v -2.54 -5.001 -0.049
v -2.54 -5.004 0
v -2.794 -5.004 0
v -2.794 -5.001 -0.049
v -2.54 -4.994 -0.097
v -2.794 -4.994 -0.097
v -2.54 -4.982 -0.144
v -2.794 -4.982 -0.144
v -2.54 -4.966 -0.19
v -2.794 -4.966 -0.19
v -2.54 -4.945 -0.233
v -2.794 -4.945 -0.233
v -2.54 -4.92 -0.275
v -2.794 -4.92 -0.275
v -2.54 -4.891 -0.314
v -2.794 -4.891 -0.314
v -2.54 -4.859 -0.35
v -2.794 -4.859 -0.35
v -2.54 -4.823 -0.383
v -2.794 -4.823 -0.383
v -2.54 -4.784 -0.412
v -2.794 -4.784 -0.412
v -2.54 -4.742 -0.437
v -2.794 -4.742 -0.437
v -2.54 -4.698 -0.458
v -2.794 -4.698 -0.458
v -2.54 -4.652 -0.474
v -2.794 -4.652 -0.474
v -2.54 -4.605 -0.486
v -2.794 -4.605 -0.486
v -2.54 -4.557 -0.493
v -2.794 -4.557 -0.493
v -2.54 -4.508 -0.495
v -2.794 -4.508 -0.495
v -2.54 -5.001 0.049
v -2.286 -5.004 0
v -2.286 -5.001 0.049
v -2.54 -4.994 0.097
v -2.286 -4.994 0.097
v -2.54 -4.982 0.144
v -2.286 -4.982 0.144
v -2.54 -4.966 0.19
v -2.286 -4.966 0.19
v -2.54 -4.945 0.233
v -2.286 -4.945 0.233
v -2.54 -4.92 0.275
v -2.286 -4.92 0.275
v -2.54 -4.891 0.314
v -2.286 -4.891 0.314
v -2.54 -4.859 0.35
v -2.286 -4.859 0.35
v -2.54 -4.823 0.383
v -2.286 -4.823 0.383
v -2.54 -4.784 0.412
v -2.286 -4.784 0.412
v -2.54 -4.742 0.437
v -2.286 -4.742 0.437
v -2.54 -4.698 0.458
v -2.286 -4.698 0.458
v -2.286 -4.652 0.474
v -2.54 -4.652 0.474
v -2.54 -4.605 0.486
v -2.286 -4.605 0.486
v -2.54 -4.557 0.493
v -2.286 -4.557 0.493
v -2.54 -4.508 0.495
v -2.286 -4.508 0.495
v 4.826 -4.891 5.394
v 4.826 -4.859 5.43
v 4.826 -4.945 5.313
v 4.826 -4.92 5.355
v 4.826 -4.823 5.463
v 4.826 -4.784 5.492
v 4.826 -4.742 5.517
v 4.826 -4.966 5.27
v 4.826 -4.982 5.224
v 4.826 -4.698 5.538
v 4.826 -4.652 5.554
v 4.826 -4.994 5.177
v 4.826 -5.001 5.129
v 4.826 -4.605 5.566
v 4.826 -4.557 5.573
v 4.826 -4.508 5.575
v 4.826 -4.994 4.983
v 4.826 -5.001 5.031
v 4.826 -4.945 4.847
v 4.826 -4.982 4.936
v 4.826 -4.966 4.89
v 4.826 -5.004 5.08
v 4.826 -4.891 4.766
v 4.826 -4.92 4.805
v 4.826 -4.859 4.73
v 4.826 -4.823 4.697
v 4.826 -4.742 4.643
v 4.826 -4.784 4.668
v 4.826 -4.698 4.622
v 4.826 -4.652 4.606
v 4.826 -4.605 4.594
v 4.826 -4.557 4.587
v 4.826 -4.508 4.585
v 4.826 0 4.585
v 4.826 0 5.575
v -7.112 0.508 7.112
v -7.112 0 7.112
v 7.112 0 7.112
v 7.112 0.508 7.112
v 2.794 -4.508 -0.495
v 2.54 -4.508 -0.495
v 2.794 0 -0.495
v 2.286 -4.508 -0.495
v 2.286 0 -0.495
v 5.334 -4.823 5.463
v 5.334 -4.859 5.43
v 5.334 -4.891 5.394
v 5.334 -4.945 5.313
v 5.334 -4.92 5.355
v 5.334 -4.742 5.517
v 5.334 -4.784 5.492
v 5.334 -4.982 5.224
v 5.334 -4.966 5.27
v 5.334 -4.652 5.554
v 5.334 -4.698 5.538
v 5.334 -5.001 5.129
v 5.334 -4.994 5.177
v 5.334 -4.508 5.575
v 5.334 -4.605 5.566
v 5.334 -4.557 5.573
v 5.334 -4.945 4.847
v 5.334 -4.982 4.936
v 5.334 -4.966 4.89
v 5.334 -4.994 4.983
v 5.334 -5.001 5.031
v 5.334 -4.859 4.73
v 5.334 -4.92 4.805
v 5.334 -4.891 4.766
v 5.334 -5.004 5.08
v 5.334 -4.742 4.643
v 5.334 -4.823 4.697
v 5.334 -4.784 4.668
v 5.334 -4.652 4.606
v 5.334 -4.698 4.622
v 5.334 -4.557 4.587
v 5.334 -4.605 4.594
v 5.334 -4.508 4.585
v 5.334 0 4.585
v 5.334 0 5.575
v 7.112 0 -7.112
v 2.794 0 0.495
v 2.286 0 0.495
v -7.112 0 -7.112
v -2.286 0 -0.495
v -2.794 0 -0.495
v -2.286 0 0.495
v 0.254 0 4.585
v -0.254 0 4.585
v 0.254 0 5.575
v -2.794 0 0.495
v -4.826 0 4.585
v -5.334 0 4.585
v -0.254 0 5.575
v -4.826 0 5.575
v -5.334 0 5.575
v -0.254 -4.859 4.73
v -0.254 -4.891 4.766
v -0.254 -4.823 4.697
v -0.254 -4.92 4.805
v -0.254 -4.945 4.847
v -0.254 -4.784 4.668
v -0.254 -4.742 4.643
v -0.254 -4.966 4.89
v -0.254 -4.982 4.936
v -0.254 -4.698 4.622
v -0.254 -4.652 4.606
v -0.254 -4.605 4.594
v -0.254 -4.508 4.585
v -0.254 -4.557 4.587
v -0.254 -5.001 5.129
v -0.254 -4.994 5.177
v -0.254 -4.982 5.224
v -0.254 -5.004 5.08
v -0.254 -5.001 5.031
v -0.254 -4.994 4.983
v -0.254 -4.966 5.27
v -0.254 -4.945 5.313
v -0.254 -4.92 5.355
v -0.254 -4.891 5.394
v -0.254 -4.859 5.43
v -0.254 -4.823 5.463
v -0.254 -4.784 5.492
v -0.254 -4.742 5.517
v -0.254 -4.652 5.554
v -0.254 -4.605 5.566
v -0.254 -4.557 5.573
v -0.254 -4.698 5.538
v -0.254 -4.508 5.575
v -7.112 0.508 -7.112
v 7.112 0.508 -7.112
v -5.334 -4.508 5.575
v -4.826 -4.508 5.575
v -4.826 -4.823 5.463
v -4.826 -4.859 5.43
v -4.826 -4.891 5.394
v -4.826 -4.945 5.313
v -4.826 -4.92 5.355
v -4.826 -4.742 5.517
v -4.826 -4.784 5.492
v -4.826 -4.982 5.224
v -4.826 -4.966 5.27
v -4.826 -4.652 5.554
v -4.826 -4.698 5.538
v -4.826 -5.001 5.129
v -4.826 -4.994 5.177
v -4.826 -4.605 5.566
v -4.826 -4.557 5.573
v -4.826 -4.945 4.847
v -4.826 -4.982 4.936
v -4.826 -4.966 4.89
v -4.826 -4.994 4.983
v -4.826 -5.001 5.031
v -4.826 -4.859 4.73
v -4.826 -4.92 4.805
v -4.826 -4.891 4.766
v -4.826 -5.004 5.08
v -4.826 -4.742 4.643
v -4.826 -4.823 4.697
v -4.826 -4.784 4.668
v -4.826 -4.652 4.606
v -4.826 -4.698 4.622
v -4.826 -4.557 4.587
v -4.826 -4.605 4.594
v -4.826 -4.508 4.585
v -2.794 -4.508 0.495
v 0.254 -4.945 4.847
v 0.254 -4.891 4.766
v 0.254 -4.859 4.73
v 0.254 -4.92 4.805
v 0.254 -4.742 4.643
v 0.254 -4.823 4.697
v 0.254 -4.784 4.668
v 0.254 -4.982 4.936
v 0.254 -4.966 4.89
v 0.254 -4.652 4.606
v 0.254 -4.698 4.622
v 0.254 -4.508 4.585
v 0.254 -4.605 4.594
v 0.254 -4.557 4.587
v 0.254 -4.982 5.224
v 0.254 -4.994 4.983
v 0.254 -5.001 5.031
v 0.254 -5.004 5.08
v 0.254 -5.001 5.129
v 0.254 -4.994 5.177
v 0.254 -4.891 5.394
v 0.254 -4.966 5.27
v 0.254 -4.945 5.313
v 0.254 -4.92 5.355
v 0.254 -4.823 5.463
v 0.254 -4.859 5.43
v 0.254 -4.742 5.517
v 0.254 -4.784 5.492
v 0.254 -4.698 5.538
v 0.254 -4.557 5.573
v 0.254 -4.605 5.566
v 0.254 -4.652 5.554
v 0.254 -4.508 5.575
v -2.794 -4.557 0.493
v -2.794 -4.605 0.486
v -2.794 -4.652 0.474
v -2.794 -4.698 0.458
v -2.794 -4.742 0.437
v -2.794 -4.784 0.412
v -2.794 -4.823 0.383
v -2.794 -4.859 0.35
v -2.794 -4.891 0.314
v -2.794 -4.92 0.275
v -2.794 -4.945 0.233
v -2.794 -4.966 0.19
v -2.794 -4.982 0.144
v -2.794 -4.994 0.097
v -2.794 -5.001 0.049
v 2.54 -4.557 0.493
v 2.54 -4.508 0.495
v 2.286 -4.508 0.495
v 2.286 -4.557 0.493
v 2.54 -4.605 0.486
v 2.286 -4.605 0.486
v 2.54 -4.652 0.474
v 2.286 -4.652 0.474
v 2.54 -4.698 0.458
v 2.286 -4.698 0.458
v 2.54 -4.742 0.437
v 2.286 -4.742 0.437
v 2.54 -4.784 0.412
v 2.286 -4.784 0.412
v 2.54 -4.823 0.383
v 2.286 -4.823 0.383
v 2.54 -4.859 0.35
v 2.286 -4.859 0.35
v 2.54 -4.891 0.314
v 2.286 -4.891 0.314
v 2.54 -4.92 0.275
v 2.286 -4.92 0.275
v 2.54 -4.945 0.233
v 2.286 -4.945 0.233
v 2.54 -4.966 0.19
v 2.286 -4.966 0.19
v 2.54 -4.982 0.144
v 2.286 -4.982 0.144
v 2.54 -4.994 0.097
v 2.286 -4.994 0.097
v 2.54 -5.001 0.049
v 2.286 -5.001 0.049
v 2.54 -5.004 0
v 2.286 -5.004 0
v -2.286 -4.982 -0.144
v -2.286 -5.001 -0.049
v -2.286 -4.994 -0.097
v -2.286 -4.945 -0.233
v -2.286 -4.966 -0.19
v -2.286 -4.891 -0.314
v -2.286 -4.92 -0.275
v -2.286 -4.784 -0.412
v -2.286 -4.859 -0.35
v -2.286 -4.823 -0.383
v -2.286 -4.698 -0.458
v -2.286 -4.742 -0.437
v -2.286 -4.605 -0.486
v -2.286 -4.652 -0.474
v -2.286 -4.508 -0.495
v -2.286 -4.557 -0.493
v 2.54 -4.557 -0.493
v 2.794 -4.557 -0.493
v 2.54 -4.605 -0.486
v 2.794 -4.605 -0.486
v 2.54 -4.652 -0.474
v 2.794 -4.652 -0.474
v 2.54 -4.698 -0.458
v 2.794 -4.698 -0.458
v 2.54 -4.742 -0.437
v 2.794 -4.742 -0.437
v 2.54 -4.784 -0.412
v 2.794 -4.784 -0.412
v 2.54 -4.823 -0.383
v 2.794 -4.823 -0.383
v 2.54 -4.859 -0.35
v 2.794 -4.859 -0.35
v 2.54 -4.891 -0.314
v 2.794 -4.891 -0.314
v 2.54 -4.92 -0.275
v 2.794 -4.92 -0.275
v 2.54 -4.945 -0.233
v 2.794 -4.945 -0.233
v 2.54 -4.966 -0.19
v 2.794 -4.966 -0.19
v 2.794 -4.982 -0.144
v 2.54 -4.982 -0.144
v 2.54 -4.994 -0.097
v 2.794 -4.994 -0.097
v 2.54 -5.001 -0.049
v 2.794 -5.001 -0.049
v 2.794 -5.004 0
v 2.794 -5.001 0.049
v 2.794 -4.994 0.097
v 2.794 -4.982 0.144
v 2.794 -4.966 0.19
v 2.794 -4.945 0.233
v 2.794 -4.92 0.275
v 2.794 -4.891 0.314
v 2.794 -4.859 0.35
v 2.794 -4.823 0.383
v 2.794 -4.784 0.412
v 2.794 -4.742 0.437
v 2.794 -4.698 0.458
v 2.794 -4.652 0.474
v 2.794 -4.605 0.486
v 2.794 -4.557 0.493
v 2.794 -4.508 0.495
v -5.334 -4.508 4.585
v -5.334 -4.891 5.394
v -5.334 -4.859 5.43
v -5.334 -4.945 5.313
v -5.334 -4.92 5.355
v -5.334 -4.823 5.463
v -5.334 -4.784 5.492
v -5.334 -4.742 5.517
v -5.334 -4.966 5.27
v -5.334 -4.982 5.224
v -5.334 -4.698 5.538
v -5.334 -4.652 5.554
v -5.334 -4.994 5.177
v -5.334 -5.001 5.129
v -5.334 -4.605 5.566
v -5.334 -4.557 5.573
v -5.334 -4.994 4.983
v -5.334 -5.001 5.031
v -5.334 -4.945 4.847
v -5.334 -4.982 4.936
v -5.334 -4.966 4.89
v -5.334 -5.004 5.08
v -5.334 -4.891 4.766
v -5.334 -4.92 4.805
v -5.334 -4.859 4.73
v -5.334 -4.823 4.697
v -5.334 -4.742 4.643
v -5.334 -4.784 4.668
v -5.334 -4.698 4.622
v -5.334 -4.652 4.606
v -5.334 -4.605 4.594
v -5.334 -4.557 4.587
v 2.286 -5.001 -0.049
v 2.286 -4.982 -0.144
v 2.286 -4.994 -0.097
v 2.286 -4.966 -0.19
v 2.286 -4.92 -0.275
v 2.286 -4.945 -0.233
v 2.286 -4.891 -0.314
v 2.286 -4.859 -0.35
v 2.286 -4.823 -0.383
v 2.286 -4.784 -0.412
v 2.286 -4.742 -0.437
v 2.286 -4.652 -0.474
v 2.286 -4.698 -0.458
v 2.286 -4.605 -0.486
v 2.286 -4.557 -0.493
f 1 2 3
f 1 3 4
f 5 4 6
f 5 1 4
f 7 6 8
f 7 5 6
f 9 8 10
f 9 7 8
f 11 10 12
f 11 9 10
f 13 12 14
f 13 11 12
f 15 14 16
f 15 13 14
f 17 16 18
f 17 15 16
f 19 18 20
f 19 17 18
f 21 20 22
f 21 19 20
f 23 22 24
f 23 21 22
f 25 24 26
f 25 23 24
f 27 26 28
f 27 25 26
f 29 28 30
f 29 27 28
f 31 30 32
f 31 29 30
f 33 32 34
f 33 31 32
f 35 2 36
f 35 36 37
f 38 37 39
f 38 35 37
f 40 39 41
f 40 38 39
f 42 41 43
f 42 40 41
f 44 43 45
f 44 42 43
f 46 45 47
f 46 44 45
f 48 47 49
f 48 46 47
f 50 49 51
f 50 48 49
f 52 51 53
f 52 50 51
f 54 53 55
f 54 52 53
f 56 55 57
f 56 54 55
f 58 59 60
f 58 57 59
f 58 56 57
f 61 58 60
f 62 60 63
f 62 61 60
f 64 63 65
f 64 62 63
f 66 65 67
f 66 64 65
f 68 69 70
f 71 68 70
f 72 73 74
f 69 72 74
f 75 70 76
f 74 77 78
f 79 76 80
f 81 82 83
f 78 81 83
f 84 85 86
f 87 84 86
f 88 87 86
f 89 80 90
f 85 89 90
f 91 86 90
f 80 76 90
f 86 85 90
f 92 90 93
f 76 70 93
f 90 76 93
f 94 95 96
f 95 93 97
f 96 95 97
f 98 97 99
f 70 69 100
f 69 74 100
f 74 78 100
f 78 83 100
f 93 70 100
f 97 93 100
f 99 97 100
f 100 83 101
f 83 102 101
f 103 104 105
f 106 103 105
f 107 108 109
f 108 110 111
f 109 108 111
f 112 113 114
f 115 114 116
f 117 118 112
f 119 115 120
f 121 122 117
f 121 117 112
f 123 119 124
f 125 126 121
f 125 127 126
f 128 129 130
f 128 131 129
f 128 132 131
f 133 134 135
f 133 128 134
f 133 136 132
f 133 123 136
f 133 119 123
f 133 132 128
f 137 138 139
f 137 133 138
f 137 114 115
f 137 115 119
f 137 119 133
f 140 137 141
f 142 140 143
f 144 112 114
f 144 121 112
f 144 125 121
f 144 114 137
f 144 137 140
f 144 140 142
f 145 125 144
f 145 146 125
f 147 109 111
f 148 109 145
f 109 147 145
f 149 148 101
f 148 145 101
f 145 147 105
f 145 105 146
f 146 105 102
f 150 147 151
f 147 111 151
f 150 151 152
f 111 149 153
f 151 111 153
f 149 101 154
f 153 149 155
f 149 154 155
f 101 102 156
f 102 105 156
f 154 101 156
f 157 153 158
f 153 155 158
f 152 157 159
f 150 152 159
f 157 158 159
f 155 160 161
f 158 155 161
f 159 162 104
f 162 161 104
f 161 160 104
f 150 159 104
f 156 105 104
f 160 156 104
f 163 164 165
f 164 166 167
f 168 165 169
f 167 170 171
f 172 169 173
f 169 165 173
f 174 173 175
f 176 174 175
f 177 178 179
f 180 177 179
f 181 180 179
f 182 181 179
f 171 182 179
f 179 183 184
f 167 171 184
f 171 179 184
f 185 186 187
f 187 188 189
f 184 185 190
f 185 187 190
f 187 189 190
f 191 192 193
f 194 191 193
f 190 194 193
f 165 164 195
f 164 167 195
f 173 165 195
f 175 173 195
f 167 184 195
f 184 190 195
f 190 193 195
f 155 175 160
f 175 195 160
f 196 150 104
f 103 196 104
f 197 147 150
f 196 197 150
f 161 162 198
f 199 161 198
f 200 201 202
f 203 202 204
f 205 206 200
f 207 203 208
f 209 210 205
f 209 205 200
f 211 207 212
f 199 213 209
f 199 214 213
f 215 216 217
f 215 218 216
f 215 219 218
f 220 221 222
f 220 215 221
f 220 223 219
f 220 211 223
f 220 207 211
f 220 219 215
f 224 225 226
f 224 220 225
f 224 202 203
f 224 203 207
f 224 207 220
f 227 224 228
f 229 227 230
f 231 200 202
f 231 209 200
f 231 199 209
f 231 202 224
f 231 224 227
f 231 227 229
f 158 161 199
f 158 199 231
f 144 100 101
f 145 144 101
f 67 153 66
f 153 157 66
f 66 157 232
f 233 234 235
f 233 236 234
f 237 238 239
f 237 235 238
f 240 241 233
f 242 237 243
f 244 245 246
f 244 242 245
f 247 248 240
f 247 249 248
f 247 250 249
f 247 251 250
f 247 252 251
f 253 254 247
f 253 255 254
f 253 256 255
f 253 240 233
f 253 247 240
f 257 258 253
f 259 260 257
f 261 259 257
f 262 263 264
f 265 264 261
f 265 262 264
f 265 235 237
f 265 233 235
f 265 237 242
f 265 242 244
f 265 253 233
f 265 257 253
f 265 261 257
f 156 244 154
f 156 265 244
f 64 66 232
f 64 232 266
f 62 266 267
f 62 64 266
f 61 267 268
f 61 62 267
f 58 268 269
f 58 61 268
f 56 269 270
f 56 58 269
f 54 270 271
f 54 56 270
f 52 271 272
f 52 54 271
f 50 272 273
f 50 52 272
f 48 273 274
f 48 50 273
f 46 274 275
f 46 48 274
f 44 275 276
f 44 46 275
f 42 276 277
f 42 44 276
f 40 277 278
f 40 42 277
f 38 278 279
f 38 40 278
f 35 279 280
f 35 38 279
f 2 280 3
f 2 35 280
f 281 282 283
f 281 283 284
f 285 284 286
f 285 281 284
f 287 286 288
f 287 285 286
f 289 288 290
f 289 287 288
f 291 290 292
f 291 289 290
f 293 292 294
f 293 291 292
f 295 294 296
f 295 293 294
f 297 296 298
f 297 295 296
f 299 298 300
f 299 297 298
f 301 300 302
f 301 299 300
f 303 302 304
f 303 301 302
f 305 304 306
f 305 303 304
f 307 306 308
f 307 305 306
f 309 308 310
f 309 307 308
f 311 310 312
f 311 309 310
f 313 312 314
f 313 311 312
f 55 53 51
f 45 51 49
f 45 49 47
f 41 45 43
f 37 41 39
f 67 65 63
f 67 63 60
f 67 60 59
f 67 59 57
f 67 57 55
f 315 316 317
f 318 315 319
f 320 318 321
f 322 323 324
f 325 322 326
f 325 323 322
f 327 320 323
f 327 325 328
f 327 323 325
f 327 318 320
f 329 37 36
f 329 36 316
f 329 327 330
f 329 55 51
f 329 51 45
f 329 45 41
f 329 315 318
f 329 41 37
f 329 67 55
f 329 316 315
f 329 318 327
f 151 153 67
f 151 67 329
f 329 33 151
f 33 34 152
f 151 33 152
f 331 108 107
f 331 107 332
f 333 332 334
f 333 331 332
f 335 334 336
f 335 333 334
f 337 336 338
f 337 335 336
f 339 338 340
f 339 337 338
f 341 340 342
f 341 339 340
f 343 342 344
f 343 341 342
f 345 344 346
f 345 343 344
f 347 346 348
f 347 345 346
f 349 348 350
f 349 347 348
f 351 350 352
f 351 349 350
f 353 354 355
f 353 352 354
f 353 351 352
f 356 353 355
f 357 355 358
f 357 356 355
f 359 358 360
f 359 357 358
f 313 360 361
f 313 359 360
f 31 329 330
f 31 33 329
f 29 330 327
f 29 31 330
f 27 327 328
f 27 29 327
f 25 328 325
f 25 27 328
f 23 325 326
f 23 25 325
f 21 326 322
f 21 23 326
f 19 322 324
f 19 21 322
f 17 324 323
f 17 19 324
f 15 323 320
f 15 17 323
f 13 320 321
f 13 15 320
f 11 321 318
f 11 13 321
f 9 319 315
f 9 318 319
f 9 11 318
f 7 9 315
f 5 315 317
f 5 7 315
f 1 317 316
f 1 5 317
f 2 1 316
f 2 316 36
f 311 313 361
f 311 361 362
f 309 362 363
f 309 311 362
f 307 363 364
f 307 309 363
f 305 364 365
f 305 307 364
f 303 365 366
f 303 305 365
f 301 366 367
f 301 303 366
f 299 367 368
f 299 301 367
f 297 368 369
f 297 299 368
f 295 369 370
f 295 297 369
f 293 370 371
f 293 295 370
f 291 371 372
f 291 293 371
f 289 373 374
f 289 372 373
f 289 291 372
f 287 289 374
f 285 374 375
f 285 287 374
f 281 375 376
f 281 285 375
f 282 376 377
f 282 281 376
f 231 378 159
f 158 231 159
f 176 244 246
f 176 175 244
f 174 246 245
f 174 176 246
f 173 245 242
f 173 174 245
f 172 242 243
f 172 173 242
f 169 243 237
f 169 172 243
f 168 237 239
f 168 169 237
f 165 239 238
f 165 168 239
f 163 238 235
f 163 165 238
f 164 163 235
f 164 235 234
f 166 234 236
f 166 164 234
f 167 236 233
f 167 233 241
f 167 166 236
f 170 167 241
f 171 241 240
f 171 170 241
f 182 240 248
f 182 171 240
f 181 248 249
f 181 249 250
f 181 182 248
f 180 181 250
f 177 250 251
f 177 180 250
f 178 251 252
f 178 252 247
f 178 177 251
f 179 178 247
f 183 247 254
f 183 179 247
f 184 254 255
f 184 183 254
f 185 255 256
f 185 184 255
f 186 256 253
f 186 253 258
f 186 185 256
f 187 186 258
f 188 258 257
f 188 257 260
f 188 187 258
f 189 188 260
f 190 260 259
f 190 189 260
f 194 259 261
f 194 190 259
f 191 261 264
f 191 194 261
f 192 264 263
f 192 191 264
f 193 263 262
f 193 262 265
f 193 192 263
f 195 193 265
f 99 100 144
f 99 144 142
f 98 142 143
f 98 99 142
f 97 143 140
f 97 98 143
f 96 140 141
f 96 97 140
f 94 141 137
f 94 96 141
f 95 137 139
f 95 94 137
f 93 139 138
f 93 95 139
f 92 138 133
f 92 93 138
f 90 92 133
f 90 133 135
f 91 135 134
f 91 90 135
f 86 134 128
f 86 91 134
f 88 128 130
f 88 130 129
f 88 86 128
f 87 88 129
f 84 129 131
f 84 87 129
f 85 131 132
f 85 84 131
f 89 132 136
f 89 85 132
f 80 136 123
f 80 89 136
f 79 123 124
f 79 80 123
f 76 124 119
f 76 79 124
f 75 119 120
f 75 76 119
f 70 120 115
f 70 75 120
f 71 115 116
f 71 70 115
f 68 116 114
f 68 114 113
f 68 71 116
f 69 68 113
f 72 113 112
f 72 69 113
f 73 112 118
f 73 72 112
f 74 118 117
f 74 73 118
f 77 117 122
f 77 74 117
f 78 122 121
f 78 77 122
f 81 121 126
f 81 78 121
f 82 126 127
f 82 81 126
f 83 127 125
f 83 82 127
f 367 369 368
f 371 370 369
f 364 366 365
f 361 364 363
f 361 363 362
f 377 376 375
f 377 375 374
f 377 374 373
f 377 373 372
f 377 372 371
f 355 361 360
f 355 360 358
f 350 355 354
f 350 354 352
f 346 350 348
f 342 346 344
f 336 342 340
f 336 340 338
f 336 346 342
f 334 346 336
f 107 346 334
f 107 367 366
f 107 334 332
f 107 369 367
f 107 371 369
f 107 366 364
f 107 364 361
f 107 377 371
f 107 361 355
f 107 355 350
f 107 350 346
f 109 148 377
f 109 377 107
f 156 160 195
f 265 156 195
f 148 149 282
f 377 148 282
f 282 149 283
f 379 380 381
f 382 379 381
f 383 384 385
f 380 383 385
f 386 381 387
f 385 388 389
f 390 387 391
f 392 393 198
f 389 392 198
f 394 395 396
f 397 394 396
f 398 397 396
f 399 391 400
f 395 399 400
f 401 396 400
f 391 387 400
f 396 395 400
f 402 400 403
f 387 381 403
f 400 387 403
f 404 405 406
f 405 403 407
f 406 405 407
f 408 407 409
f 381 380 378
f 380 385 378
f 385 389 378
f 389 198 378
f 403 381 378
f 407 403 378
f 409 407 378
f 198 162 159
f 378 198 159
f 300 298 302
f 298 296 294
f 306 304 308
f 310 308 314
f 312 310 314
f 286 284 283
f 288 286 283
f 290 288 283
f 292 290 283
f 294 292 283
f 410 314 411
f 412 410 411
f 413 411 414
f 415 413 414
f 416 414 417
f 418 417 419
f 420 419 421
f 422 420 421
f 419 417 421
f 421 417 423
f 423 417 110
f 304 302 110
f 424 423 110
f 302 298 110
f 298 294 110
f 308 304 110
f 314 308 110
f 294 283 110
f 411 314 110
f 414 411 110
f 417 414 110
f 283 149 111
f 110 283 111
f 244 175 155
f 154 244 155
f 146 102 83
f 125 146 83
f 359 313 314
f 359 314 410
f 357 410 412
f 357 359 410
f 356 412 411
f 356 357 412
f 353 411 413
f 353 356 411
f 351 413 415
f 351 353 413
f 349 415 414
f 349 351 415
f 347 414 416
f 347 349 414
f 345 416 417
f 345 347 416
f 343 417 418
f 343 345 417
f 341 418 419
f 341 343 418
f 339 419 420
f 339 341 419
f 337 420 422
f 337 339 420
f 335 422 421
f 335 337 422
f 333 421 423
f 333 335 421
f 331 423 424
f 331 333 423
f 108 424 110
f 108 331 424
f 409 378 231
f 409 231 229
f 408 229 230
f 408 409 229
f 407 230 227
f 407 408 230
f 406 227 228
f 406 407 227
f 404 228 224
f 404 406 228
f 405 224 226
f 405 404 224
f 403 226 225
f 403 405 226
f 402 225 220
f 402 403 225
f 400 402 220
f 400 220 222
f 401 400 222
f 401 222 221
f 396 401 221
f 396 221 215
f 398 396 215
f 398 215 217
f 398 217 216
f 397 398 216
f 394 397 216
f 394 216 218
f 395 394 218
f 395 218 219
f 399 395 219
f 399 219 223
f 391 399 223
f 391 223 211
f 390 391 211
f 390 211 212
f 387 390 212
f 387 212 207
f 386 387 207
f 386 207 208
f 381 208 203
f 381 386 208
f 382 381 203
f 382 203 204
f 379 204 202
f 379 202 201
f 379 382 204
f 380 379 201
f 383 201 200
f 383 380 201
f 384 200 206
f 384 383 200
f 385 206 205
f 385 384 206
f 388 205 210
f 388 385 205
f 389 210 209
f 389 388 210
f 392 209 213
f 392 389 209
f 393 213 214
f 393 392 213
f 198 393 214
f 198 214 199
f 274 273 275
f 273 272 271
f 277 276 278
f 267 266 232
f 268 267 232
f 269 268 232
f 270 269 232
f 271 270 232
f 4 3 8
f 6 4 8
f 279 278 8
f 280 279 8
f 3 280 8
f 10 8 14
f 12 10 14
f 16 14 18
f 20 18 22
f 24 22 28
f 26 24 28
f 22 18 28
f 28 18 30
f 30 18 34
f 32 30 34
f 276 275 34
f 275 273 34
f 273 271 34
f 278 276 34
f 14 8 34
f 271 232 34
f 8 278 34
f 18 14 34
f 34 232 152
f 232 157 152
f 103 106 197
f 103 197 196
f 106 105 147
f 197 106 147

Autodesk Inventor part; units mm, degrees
sketch "Sketch_1" plane through (0, 0, 0) normal (0, 1, 0) x (-1, 0, 0)
  line L0 (7.112, -7.112) -> (7.112, 7.112)
  line L1 (7.112, 7.112) -> (-7.112, 7.112)
  line L2 (-7.112, 7.112) -> (-7.112, -7.112)
  line L3 (-7.112, -7.112) -> (7.112, -7.112)
extrude "Extrusion1" add sketch "Sketch_1" along normal blind 0.508
sketch "Sketch_10" plane through (-5.08, 0, 0) normal (1, 0, 0) x (0, 0, -1)
  arc A0 (-5.5753, -4.5085) -> (-5.08, -5.0038) centre (-5.08, -4.5085) ccw
  arc A1 (-5.08, -5.0038) -> (-4.5847, -4.5085) centre (-5.08, -4.5085) ccw
  line L0 (-4.5847, -4.5085) -> (-4.5847, 0.508)
  line L1 (-4.5847, 0.508) -> (-5.5753, 0.508)
  line L2 (-5.5753, 0.508) -> (-5.5753, -4.5085)
extrude "Extrusion2" add sketch "Sketch_10" along normal mid plane 0.508
sketch "Sketch_12" plane through (0, 0, 0) normal (1, 0, 0) x (0, 1, 0)
  arc A0 (-4.5085, 5.5753) -> (-5.0038, 5.08) centre (-4.5085, 5.08) ccw
  arc A1 (-5.0038, 5.08) -> (-4.5085, 4.5847) centre (-4.5085, 5.08) ccw
  line L0 (-4.5085, 4.5847) -> (0.508, 4.5847)
  line L1 (0.508, 4.5847) -> (0.508, 5.5753)
  line L2 (0.508, 5.5753) -> (-4.5085, 5.5753)
extrude "Extrusion3" add sketch "Sketch_12" along normal mid plane 0.508
sketch "Sketch_14" plane through (5.08, 0, 0) normal (1, 0, 0) x (0, 0, -1)
  arc A0 (-5.5753, -4.5085) -> (-5.08, -5.0038) centre (-5.08, -4.5085) ccw
  arc A1 (-5.08, -5.0038) -> (-4.5847, -4.5085) centre (-5.08, -4.5085) ccw
  line L0 (-4.5847, -4.5085) -> (-4.5847, 0.508)
  line L1 (-4.5847, 0.508) -> (-5.5753, 0.508)
  line L2 (-5.5753, 0.508) -> (-5.5753, -4.5085)
extrude "Extrusion4" add sketch "Sketch_14" along normal mid plane 0.508
sketch "Sketch_16" plane through (-2.54, 0, 0) normal (1, 0, 0) x (0, 0, -1)
  line L0 (-0.4953, 0.508) -> (-0.4953, -4.5085)
  arc A0 (-0.4953, -4.5085) -> (0, -5.0038) centre (0, -4.5085) ccw
  arc A1 (0, -5.0038) -> (0.4953, -4.5085) centre (0, -4.5085) ccw
  line L1 (0.4953, -4.5085) -> (0.4953, 0.508)
  line L2 (0.4953, 0.508) -> (-0.4953, 0.508)
extrude "Extrusion5" add sketch "Sketch_16" along normal mid plane 0.508
sketch "Sketch_17" plane through (2.54, 0, 0) normal (1, 0, 0) x (0, 0, -1)
  line L0 (-0.4953, 0.508) -> (-0.4953, -4.5085)
  arc A0 (-0.4953, -4.5085) -> (0, -5.0038) centre (0, -4.5085) ccw
  arc A1 (0, -5.0038) -> (0.4953, -4.5085) centre (0, -4.5085) ccw
  line L1 (0.4953, -4.5085) -> (0.4953, 0.508)
  line L2 (0.4953, 0.508) -> (-0.4953, 0.508)
extrude "Extrusion6" add sketch "Sketch_17" along normal mid plane 0.508
ref_plane "pole_to_body_XY" through (0, 0.508, 0) normal (0, 1, 0) x (1, 0, 0)
ref_plane "pole_to_body_YZ" through (0, 0.508, 0) normal (1, 0, 0) x (0, 0, -1)
ref_plane "pole_to_body_ZX" through (0, 0.508, 0) normal (0, 0, -1) x (0, 1, 0)
properties part number "UB21G035D-1JBpole"
